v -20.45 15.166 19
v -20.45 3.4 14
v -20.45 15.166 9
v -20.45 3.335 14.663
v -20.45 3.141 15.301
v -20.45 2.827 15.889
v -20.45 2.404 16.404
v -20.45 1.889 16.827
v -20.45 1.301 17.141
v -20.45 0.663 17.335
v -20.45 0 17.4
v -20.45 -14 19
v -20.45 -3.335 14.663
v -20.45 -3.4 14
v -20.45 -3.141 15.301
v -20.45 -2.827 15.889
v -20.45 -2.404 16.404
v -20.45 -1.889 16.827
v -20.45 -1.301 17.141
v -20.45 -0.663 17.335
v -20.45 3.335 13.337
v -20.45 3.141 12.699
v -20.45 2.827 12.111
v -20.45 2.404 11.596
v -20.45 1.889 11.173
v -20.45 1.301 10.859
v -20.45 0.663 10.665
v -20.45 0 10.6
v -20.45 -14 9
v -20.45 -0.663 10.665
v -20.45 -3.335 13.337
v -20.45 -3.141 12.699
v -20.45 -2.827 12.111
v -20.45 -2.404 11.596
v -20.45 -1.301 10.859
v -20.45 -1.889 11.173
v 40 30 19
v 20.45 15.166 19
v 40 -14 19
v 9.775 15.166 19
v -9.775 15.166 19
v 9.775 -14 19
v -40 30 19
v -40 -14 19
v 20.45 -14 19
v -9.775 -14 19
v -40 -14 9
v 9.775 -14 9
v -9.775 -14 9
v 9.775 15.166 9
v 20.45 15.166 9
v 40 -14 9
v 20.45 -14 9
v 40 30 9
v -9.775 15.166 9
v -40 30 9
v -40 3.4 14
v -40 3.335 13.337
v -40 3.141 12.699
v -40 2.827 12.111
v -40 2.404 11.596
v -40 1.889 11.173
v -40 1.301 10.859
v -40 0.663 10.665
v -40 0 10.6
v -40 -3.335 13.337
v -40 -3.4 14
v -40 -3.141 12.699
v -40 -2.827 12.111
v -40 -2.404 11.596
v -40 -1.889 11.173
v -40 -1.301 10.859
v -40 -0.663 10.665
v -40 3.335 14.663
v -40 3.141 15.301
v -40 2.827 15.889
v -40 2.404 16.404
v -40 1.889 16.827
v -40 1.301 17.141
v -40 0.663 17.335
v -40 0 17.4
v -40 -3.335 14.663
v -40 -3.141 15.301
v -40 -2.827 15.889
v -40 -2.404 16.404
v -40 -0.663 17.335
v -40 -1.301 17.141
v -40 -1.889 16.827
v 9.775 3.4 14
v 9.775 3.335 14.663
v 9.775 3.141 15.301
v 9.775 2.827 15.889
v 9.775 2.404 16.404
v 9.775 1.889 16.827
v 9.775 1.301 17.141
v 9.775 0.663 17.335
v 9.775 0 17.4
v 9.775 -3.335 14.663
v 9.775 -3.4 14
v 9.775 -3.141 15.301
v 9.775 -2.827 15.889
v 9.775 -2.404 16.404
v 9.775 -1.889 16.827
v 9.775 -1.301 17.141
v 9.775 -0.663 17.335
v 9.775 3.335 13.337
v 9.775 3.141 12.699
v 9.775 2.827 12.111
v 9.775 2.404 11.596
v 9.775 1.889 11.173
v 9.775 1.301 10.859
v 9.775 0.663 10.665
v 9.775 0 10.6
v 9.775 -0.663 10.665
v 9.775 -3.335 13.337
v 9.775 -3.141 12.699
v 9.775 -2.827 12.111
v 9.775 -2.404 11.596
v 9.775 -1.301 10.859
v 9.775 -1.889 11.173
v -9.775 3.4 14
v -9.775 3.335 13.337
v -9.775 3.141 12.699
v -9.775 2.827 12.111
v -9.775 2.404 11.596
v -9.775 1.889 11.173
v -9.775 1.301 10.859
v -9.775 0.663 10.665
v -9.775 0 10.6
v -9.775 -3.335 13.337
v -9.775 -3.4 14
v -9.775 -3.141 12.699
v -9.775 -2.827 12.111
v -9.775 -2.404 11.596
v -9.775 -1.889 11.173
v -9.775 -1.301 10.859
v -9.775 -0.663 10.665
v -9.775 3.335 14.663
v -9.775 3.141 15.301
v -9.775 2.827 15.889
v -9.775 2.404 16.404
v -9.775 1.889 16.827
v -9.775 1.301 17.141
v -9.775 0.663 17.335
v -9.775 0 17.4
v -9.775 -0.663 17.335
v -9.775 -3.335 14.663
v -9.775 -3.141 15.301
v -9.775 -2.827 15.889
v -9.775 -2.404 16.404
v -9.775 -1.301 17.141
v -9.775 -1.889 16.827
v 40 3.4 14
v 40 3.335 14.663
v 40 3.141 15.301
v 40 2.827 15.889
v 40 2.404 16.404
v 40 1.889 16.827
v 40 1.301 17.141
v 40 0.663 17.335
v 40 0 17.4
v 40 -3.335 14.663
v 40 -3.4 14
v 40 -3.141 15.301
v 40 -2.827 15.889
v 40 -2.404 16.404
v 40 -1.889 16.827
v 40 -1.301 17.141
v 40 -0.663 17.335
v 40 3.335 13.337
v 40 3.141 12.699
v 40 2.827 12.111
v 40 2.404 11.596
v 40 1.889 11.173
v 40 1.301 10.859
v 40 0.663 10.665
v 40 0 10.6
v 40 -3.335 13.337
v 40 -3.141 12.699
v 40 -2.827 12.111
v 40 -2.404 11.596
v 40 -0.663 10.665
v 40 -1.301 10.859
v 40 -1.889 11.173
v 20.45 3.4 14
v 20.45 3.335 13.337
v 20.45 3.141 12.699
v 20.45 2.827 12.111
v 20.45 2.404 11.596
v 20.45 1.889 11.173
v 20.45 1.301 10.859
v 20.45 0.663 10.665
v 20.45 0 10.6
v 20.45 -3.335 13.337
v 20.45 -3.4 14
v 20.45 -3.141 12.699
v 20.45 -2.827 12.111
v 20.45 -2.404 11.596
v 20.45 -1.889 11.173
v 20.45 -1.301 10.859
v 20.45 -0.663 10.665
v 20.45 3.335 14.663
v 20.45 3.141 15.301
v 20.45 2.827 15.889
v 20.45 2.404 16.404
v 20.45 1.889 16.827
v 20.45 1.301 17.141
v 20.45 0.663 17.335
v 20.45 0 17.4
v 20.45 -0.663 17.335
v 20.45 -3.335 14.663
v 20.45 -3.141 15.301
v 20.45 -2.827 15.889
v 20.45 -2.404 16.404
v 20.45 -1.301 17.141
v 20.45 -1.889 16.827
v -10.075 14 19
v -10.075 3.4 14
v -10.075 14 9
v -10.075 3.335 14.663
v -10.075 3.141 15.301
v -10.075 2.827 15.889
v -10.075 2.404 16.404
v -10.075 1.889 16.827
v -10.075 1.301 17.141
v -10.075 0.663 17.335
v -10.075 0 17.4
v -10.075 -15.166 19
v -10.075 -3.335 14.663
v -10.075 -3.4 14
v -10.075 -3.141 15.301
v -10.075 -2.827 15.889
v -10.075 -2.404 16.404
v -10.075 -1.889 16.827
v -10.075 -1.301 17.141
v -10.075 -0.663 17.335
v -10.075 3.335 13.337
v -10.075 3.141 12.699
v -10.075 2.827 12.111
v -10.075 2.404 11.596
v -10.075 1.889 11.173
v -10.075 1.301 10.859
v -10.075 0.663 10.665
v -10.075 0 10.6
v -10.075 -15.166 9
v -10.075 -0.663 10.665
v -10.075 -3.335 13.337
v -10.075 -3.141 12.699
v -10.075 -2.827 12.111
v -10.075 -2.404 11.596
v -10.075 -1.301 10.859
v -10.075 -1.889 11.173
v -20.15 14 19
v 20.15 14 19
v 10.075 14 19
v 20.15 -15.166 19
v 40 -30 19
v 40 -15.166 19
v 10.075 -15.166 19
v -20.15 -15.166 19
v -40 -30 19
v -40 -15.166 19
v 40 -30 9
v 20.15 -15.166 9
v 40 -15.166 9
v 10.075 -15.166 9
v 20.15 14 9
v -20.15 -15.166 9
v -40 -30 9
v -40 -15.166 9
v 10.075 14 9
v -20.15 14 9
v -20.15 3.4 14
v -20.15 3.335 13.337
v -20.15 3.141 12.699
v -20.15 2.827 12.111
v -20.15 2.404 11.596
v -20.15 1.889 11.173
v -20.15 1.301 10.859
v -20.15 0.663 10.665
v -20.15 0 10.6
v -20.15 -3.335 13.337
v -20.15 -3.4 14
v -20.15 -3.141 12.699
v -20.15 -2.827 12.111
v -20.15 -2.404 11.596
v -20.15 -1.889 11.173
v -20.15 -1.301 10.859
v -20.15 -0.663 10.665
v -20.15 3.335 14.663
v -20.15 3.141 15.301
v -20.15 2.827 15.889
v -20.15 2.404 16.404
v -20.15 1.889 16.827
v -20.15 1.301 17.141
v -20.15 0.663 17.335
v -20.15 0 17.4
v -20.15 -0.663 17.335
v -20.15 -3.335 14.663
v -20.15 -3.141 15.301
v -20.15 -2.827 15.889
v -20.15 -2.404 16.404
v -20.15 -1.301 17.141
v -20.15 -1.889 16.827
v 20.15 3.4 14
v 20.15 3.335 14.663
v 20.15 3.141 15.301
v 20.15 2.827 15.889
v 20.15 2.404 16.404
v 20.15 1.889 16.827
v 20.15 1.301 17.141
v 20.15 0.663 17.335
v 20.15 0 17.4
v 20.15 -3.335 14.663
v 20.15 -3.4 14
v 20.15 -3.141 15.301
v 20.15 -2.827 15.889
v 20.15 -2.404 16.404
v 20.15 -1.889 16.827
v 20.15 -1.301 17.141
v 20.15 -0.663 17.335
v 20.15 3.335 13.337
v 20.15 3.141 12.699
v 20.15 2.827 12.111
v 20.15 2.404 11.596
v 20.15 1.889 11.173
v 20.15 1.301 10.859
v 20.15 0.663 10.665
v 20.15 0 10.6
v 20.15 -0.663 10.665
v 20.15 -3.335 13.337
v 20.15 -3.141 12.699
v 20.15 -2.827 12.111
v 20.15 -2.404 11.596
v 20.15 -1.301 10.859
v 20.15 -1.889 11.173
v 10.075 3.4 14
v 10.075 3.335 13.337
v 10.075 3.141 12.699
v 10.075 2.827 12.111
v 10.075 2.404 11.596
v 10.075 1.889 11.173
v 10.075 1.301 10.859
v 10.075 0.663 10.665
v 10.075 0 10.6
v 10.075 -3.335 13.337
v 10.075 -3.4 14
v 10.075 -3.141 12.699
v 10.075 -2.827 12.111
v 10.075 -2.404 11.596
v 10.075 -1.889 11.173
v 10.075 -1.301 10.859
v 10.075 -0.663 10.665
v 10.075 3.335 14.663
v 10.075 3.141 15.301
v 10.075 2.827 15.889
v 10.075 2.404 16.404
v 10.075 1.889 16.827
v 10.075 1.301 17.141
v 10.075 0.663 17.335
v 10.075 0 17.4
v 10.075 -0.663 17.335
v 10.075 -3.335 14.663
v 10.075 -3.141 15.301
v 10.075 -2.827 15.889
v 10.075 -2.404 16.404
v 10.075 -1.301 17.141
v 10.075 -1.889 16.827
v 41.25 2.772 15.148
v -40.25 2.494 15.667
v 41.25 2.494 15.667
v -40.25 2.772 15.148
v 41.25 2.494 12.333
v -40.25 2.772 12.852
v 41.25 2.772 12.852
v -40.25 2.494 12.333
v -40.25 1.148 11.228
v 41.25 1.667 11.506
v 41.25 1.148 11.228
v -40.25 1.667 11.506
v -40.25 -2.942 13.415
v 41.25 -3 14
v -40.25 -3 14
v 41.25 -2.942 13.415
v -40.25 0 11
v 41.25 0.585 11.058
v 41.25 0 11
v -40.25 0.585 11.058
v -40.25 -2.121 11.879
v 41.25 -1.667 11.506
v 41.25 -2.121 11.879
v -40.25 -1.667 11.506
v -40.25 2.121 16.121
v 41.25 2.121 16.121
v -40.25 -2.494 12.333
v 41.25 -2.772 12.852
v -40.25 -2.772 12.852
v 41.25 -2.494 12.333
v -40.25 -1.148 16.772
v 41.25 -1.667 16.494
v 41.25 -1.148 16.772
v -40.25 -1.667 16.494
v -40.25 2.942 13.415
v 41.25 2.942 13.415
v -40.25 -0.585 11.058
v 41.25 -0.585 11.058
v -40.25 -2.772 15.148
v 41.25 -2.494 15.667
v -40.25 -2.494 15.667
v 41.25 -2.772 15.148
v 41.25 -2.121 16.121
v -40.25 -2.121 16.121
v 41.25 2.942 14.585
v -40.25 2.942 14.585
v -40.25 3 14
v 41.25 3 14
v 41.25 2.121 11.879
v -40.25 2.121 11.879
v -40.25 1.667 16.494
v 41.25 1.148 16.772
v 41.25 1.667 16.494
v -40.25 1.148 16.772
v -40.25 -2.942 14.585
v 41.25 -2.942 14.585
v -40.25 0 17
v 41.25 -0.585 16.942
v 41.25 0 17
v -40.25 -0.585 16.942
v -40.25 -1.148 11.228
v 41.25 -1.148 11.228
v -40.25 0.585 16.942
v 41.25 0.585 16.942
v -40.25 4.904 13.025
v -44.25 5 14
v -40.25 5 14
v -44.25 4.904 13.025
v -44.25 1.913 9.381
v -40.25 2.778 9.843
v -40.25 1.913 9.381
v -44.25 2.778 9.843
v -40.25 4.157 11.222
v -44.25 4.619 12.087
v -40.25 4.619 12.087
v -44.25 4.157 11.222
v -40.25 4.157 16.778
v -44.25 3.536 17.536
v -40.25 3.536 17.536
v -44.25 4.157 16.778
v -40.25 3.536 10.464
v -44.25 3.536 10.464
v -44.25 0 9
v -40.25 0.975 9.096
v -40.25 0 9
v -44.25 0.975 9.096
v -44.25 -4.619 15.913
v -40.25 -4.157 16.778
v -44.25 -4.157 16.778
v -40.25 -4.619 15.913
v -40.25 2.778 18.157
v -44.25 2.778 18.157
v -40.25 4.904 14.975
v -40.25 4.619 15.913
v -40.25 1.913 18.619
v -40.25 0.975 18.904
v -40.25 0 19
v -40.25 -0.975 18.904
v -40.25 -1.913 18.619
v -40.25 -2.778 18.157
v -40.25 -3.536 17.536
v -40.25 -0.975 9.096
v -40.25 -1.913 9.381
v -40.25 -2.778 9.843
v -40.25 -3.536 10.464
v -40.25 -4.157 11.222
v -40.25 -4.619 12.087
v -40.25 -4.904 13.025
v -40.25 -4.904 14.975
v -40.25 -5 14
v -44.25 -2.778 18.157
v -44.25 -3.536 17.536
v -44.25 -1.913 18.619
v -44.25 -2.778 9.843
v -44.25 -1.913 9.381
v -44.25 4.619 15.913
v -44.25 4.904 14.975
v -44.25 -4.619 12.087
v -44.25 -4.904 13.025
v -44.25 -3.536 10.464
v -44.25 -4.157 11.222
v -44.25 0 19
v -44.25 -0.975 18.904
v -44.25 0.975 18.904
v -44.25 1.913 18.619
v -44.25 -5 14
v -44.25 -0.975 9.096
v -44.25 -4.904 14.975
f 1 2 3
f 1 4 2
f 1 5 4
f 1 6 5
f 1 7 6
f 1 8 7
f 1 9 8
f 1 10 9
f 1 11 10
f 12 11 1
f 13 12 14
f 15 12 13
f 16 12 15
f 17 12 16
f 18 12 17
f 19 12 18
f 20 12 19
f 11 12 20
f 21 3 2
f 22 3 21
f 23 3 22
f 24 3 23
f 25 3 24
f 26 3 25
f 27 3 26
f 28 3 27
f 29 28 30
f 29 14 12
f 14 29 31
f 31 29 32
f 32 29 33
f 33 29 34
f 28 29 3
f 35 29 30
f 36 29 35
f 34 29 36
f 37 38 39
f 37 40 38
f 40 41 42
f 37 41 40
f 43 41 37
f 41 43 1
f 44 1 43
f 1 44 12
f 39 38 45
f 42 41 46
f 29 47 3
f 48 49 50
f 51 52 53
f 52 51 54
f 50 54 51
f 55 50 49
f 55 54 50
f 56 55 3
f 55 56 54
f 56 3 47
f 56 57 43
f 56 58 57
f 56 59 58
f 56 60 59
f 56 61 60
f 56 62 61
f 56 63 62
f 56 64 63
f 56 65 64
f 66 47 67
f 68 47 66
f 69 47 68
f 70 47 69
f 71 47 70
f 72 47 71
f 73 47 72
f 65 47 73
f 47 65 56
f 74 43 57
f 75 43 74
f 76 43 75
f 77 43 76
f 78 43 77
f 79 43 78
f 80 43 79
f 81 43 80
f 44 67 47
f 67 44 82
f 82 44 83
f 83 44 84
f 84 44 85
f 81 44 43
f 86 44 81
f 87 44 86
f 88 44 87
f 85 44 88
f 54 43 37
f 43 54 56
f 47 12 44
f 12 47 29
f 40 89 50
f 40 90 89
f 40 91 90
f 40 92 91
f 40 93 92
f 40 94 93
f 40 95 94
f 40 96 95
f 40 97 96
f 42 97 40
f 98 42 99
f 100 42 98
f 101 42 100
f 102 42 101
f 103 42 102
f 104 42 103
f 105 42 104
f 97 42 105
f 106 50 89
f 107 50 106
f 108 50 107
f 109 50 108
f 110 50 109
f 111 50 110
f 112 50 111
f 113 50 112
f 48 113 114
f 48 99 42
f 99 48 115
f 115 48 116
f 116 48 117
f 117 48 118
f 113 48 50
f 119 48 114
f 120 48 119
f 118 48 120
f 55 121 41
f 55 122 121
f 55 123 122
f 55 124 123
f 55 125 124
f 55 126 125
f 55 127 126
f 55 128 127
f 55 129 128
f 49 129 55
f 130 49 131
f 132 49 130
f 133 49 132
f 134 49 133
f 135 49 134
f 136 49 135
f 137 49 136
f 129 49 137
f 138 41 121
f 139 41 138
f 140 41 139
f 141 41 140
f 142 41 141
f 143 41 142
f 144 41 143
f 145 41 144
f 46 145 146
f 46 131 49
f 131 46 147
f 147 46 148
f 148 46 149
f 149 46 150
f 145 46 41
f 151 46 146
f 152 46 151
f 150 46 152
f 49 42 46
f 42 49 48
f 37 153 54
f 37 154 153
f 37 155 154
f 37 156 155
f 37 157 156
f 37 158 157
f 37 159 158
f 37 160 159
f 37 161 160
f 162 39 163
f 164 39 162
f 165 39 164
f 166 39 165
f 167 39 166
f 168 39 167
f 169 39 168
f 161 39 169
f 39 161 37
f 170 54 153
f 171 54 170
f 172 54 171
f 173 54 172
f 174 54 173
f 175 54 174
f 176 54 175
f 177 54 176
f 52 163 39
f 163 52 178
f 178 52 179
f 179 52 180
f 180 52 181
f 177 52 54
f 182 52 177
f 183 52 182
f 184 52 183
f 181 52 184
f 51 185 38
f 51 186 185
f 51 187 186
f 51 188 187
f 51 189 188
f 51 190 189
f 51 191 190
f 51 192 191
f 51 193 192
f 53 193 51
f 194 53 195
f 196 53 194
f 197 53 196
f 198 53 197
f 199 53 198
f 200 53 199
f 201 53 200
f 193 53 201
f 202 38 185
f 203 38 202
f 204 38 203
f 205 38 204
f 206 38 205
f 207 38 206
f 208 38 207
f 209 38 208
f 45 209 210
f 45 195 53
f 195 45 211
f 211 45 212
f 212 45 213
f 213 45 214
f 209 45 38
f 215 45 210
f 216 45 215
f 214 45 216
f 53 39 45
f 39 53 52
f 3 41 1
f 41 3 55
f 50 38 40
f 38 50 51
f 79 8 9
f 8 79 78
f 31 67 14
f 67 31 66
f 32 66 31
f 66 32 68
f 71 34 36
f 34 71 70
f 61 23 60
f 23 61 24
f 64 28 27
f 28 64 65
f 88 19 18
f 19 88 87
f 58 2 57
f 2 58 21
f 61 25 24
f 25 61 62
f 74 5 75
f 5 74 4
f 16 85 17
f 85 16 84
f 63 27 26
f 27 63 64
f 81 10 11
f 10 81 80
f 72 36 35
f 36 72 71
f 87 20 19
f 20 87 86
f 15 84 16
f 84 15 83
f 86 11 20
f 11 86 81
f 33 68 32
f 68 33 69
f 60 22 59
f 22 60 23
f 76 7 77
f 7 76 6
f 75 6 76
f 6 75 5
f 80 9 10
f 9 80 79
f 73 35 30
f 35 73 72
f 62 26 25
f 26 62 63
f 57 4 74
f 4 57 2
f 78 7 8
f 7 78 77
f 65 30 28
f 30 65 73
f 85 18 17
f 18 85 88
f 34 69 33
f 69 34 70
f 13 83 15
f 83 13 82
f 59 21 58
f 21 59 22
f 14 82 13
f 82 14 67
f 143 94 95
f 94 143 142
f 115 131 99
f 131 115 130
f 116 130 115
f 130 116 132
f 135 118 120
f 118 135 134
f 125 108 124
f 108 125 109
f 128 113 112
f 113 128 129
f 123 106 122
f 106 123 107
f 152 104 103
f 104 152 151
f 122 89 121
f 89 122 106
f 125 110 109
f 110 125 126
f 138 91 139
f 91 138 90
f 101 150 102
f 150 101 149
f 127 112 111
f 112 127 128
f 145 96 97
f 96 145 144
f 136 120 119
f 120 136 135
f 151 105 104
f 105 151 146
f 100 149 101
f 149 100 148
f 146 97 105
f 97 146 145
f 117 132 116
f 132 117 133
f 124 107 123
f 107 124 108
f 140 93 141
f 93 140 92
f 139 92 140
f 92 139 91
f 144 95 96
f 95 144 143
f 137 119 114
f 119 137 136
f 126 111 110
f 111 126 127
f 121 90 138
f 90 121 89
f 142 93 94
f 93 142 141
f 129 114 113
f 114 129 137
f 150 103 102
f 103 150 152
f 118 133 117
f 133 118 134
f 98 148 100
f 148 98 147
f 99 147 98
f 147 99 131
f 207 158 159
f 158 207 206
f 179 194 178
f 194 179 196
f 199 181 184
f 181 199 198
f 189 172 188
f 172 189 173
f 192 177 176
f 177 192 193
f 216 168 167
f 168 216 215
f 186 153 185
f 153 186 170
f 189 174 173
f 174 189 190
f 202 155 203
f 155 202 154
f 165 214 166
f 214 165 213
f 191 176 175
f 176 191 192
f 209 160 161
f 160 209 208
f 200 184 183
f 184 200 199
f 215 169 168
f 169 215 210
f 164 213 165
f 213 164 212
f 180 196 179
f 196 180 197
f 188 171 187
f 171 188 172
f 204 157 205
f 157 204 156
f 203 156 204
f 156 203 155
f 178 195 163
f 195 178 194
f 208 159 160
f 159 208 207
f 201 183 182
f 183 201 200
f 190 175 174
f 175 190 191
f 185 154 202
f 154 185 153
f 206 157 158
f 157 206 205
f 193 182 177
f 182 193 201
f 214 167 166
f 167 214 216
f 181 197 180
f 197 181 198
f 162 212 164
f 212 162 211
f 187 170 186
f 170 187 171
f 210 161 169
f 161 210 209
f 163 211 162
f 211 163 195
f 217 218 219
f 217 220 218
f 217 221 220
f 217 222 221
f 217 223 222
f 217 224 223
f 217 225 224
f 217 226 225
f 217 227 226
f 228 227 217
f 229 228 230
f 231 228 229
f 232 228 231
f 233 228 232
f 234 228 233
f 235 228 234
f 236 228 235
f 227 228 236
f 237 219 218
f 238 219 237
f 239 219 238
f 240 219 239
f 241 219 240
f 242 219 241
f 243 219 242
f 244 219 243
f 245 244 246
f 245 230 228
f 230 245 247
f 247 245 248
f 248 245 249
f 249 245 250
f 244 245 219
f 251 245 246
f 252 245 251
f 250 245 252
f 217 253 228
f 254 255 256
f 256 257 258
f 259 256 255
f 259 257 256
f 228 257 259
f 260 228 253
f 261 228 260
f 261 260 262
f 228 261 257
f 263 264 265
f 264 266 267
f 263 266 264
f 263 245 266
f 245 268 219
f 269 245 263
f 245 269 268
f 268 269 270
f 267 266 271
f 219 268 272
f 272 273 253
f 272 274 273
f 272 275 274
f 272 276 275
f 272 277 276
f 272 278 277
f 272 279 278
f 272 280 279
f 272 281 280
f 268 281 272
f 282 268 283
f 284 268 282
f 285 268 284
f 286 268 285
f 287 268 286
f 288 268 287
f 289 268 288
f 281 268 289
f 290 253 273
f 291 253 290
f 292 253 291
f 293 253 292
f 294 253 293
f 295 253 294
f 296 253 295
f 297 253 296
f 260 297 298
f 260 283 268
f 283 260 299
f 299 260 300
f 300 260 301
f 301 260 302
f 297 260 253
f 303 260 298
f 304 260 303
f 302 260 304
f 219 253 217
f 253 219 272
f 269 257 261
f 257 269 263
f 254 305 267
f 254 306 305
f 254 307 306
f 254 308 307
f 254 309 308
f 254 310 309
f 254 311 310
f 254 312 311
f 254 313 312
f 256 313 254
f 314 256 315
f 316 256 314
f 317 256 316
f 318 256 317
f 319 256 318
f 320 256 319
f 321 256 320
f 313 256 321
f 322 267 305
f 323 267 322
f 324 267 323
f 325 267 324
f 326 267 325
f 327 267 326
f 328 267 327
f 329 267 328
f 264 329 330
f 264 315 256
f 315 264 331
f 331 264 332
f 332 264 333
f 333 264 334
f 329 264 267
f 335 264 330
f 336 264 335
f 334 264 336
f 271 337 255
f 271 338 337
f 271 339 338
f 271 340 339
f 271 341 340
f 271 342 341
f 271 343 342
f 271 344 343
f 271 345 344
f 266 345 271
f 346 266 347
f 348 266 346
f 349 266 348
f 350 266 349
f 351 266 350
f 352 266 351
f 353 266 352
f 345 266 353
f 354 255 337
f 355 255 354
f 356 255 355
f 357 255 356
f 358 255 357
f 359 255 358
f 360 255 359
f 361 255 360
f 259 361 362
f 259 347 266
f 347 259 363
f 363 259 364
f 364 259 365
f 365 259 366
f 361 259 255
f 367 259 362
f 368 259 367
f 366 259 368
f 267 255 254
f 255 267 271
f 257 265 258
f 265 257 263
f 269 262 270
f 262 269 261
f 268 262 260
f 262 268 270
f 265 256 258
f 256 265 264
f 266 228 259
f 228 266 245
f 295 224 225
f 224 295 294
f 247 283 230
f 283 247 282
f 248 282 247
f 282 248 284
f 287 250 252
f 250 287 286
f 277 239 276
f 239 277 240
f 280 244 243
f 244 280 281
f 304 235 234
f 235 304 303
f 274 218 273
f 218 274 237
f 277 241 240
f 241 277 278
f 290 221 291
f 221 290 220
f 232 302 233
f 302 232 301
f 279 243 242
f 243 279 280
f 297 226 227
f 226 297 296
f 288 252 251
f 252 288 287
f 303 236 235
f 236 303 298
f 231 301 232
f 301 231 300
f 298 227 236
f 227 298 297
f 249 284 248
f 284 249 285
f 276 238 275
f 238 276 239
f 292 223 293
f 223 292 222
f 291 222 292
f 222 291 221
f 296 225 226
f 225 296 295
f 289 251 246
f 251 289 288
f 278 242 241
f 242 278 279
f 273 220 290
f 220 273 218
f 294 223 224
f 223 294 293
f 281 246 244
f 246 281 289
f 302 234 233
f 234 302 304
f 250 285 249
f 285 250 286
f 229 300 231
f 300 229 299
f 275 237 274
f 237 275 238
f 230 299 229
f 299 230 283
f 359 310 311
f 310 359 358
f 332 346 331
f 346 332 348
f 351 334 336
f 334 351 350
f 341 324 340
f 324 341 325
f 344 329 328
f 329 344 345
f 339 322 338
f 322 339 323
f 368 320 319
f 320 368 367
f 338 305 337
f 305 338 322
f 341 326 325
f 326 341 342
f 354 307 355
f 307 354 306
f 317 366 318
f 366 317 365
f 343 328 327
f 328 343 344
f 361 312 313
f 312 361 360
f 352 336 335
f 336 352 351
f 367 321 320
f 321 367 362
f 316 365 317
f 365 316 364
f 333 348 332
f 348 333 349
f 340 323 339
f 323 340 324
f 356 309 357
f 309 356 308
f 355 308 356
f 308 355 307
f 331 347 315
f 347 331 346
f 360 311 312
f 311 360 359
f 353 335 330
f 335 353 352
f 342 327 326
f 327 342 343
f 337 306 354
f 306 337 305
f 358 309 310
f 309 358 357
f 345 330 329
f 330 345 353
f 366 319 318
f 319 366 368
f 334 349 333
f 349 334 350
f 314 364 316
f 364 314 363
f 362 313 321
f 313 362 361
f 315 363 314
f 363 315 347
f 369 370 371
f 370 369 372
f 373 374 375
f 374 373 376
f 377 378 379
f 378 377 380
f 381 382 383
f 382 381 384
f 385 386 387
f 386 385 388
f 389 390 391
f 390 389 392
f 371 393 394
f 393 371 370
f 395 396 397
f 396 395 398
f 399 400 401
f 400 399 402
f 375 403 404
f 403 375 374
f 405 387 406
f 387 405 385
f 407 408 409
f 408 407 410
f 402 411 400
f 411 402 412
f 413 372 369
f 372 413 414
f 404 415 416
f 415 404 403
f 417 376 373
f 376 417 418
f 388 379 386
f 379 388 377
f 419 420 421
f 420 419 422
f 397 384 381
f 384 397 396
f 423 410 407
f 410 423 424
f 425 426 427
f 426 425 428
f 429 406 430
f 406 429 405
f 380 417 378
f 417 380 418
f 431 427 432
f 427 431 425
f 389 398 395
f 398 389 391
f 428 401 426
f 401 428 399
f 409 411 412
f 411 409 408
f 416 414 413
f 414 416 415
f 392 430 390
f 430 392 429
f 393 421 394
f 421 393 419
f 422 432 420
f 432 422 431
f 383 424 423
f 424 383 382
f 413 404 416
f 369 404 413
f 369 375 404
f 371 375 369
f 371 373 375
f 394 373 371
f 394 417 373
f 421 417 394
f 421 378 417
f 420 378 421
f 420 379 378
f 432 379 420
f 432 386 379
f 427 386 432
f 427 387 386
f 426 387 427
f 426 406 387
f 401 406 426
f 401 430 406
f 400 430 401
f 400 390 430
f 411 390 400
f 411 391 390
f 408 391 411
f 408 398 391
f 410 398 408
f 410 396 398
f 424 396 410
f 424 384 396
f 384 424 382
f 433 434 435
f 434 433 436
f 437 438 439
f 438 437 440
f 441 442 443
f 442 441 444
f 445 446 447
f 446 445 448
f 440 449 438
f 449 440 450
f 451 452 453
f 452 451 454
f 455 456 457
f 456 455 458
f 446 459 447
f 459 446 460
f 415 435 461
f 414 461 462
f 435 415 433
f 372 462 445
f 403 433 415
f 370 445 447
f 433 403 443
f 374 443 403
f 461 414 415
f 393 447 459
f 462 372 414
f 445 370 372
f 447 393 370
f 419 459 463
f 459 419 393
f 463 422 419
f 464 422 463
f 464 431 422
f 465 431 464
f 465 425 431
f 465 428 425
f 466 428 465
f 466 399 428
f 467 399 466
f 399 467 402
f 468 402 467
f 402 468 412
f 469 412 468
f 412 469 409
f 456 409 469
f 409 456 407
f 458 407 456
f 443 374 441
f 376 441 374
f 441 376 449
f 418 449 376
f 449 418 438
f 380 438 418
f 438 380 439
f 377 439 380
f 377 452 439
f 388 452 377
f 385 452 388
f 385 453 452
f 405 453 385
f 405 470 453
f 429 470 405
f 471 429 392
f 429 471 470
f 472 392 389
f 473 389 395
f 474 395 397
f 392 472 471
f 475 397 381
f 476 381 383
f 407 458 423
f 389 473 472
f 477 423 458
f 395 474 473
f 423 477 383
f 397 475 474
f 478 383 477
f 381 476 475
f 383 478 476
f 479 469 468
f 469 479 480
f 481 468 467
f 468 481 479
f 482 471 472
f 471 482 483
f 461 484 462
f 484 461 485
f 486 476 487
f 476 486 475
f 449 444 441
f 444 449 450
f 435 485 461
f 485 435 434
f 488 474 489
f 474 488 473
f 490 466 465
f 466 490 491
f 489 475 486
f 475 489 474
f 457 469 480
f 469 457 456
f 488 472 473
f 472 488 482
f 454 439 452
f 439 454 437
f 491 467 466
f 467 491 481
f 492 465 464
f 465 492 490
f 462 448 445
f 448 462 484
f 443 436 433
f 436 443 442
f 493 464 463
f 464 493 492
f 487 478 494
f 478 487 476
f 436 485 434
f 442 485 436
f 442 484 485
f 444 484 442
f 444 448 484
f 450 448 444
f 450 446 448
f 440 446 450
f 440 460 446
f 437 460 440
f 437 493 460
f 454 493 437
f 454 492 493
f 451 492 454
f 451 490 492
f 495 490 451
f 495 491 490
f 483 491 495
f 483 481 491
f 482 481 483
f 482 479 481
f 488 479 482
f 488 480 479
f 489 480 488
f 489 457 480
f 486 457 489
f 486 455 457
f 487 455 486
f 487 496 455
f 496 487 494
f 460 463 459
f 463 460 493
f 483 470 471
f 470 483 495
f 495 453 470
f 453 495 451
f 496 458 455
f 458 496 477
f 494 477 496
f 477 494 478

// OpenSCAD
$fn = 32;

// ------------------------------------------------------------------------
// Butt hinge: hinge 80 mm, leaf swung 0 deg
// Every part is its own module, assembly() places every instance.
// ------------------------------------------------------------------------

// --- part 1 ---
module hinge_base() {
  difference() {
    union() {
      translate([-40, -14, -5]) cube([19.55, 44, 10]);
      translate([-9.775, -14, -5]) cube([19.55, 44, 10]);
      translate([20.45, -14, -5]) cube([19.55, 44, 10]);
      translate([-40, 15.166, -5]) cube([80, 14.834, 10]);
    }
    translate([-30.225, 0, 0]) rotate([0, 90, 0]) cylinder(h = 21.55, d = 6.8, center = true);
    translate([0, 0, 0]) rotate([0, 90, 0]) cylinder(h = 21.55, d = 6.8, center = true);
    translate([30.225, 0, 0]) rotate([0, 90, 0]) cylinder(h = 21.55, d = 6.8, center = true);
  }
}

// --- part 2 ---
module hinge_mover() {
  difference() {
    union() {
      translate([-20.15, -30, -5]) cube([10.075, 44, 10]);
      translate([10.075, -30, -5]) cube([10.075, 44, 10]);
      translate([-40, -30, -5]) cube([80, 14.834, 10]);
    }
    translate([-15.113, 0, 0]) rotate([0, 90, 0]) cylinder(h = 12.075, d = 6.8, center = true);
    translate([15.113, 0, 0]) rotate([0, 90, 0]) cylinder(h = 12.075, d = 6.8, center = true);
  }
}

// --- part 3 ---
module hinge_pin() {
  rotate([0, 90, 0]) cylinder(h = 82.5, d = 6, center = true);
  translate([-44.25, 0, 0]) rotate([0, 90, 0]) cylinder(h = 4, d = 10);
}

// --- assembly ---
module assembly() {
  color([0.80, 0.24, 0.20]) translate([0, 0, 14]) rotate([0, 0, 0]) hinge_base();
  color([0.20, 0.45, 0.75]) translate([0, 0, 14]) rotate([0, 0, 0]) hinge_mover();
  color([0.25, 0.62, 0.32]) translate([0, 0, 14]) rotate([0, 0, 0]) hinge_pin();
}

assembly();
